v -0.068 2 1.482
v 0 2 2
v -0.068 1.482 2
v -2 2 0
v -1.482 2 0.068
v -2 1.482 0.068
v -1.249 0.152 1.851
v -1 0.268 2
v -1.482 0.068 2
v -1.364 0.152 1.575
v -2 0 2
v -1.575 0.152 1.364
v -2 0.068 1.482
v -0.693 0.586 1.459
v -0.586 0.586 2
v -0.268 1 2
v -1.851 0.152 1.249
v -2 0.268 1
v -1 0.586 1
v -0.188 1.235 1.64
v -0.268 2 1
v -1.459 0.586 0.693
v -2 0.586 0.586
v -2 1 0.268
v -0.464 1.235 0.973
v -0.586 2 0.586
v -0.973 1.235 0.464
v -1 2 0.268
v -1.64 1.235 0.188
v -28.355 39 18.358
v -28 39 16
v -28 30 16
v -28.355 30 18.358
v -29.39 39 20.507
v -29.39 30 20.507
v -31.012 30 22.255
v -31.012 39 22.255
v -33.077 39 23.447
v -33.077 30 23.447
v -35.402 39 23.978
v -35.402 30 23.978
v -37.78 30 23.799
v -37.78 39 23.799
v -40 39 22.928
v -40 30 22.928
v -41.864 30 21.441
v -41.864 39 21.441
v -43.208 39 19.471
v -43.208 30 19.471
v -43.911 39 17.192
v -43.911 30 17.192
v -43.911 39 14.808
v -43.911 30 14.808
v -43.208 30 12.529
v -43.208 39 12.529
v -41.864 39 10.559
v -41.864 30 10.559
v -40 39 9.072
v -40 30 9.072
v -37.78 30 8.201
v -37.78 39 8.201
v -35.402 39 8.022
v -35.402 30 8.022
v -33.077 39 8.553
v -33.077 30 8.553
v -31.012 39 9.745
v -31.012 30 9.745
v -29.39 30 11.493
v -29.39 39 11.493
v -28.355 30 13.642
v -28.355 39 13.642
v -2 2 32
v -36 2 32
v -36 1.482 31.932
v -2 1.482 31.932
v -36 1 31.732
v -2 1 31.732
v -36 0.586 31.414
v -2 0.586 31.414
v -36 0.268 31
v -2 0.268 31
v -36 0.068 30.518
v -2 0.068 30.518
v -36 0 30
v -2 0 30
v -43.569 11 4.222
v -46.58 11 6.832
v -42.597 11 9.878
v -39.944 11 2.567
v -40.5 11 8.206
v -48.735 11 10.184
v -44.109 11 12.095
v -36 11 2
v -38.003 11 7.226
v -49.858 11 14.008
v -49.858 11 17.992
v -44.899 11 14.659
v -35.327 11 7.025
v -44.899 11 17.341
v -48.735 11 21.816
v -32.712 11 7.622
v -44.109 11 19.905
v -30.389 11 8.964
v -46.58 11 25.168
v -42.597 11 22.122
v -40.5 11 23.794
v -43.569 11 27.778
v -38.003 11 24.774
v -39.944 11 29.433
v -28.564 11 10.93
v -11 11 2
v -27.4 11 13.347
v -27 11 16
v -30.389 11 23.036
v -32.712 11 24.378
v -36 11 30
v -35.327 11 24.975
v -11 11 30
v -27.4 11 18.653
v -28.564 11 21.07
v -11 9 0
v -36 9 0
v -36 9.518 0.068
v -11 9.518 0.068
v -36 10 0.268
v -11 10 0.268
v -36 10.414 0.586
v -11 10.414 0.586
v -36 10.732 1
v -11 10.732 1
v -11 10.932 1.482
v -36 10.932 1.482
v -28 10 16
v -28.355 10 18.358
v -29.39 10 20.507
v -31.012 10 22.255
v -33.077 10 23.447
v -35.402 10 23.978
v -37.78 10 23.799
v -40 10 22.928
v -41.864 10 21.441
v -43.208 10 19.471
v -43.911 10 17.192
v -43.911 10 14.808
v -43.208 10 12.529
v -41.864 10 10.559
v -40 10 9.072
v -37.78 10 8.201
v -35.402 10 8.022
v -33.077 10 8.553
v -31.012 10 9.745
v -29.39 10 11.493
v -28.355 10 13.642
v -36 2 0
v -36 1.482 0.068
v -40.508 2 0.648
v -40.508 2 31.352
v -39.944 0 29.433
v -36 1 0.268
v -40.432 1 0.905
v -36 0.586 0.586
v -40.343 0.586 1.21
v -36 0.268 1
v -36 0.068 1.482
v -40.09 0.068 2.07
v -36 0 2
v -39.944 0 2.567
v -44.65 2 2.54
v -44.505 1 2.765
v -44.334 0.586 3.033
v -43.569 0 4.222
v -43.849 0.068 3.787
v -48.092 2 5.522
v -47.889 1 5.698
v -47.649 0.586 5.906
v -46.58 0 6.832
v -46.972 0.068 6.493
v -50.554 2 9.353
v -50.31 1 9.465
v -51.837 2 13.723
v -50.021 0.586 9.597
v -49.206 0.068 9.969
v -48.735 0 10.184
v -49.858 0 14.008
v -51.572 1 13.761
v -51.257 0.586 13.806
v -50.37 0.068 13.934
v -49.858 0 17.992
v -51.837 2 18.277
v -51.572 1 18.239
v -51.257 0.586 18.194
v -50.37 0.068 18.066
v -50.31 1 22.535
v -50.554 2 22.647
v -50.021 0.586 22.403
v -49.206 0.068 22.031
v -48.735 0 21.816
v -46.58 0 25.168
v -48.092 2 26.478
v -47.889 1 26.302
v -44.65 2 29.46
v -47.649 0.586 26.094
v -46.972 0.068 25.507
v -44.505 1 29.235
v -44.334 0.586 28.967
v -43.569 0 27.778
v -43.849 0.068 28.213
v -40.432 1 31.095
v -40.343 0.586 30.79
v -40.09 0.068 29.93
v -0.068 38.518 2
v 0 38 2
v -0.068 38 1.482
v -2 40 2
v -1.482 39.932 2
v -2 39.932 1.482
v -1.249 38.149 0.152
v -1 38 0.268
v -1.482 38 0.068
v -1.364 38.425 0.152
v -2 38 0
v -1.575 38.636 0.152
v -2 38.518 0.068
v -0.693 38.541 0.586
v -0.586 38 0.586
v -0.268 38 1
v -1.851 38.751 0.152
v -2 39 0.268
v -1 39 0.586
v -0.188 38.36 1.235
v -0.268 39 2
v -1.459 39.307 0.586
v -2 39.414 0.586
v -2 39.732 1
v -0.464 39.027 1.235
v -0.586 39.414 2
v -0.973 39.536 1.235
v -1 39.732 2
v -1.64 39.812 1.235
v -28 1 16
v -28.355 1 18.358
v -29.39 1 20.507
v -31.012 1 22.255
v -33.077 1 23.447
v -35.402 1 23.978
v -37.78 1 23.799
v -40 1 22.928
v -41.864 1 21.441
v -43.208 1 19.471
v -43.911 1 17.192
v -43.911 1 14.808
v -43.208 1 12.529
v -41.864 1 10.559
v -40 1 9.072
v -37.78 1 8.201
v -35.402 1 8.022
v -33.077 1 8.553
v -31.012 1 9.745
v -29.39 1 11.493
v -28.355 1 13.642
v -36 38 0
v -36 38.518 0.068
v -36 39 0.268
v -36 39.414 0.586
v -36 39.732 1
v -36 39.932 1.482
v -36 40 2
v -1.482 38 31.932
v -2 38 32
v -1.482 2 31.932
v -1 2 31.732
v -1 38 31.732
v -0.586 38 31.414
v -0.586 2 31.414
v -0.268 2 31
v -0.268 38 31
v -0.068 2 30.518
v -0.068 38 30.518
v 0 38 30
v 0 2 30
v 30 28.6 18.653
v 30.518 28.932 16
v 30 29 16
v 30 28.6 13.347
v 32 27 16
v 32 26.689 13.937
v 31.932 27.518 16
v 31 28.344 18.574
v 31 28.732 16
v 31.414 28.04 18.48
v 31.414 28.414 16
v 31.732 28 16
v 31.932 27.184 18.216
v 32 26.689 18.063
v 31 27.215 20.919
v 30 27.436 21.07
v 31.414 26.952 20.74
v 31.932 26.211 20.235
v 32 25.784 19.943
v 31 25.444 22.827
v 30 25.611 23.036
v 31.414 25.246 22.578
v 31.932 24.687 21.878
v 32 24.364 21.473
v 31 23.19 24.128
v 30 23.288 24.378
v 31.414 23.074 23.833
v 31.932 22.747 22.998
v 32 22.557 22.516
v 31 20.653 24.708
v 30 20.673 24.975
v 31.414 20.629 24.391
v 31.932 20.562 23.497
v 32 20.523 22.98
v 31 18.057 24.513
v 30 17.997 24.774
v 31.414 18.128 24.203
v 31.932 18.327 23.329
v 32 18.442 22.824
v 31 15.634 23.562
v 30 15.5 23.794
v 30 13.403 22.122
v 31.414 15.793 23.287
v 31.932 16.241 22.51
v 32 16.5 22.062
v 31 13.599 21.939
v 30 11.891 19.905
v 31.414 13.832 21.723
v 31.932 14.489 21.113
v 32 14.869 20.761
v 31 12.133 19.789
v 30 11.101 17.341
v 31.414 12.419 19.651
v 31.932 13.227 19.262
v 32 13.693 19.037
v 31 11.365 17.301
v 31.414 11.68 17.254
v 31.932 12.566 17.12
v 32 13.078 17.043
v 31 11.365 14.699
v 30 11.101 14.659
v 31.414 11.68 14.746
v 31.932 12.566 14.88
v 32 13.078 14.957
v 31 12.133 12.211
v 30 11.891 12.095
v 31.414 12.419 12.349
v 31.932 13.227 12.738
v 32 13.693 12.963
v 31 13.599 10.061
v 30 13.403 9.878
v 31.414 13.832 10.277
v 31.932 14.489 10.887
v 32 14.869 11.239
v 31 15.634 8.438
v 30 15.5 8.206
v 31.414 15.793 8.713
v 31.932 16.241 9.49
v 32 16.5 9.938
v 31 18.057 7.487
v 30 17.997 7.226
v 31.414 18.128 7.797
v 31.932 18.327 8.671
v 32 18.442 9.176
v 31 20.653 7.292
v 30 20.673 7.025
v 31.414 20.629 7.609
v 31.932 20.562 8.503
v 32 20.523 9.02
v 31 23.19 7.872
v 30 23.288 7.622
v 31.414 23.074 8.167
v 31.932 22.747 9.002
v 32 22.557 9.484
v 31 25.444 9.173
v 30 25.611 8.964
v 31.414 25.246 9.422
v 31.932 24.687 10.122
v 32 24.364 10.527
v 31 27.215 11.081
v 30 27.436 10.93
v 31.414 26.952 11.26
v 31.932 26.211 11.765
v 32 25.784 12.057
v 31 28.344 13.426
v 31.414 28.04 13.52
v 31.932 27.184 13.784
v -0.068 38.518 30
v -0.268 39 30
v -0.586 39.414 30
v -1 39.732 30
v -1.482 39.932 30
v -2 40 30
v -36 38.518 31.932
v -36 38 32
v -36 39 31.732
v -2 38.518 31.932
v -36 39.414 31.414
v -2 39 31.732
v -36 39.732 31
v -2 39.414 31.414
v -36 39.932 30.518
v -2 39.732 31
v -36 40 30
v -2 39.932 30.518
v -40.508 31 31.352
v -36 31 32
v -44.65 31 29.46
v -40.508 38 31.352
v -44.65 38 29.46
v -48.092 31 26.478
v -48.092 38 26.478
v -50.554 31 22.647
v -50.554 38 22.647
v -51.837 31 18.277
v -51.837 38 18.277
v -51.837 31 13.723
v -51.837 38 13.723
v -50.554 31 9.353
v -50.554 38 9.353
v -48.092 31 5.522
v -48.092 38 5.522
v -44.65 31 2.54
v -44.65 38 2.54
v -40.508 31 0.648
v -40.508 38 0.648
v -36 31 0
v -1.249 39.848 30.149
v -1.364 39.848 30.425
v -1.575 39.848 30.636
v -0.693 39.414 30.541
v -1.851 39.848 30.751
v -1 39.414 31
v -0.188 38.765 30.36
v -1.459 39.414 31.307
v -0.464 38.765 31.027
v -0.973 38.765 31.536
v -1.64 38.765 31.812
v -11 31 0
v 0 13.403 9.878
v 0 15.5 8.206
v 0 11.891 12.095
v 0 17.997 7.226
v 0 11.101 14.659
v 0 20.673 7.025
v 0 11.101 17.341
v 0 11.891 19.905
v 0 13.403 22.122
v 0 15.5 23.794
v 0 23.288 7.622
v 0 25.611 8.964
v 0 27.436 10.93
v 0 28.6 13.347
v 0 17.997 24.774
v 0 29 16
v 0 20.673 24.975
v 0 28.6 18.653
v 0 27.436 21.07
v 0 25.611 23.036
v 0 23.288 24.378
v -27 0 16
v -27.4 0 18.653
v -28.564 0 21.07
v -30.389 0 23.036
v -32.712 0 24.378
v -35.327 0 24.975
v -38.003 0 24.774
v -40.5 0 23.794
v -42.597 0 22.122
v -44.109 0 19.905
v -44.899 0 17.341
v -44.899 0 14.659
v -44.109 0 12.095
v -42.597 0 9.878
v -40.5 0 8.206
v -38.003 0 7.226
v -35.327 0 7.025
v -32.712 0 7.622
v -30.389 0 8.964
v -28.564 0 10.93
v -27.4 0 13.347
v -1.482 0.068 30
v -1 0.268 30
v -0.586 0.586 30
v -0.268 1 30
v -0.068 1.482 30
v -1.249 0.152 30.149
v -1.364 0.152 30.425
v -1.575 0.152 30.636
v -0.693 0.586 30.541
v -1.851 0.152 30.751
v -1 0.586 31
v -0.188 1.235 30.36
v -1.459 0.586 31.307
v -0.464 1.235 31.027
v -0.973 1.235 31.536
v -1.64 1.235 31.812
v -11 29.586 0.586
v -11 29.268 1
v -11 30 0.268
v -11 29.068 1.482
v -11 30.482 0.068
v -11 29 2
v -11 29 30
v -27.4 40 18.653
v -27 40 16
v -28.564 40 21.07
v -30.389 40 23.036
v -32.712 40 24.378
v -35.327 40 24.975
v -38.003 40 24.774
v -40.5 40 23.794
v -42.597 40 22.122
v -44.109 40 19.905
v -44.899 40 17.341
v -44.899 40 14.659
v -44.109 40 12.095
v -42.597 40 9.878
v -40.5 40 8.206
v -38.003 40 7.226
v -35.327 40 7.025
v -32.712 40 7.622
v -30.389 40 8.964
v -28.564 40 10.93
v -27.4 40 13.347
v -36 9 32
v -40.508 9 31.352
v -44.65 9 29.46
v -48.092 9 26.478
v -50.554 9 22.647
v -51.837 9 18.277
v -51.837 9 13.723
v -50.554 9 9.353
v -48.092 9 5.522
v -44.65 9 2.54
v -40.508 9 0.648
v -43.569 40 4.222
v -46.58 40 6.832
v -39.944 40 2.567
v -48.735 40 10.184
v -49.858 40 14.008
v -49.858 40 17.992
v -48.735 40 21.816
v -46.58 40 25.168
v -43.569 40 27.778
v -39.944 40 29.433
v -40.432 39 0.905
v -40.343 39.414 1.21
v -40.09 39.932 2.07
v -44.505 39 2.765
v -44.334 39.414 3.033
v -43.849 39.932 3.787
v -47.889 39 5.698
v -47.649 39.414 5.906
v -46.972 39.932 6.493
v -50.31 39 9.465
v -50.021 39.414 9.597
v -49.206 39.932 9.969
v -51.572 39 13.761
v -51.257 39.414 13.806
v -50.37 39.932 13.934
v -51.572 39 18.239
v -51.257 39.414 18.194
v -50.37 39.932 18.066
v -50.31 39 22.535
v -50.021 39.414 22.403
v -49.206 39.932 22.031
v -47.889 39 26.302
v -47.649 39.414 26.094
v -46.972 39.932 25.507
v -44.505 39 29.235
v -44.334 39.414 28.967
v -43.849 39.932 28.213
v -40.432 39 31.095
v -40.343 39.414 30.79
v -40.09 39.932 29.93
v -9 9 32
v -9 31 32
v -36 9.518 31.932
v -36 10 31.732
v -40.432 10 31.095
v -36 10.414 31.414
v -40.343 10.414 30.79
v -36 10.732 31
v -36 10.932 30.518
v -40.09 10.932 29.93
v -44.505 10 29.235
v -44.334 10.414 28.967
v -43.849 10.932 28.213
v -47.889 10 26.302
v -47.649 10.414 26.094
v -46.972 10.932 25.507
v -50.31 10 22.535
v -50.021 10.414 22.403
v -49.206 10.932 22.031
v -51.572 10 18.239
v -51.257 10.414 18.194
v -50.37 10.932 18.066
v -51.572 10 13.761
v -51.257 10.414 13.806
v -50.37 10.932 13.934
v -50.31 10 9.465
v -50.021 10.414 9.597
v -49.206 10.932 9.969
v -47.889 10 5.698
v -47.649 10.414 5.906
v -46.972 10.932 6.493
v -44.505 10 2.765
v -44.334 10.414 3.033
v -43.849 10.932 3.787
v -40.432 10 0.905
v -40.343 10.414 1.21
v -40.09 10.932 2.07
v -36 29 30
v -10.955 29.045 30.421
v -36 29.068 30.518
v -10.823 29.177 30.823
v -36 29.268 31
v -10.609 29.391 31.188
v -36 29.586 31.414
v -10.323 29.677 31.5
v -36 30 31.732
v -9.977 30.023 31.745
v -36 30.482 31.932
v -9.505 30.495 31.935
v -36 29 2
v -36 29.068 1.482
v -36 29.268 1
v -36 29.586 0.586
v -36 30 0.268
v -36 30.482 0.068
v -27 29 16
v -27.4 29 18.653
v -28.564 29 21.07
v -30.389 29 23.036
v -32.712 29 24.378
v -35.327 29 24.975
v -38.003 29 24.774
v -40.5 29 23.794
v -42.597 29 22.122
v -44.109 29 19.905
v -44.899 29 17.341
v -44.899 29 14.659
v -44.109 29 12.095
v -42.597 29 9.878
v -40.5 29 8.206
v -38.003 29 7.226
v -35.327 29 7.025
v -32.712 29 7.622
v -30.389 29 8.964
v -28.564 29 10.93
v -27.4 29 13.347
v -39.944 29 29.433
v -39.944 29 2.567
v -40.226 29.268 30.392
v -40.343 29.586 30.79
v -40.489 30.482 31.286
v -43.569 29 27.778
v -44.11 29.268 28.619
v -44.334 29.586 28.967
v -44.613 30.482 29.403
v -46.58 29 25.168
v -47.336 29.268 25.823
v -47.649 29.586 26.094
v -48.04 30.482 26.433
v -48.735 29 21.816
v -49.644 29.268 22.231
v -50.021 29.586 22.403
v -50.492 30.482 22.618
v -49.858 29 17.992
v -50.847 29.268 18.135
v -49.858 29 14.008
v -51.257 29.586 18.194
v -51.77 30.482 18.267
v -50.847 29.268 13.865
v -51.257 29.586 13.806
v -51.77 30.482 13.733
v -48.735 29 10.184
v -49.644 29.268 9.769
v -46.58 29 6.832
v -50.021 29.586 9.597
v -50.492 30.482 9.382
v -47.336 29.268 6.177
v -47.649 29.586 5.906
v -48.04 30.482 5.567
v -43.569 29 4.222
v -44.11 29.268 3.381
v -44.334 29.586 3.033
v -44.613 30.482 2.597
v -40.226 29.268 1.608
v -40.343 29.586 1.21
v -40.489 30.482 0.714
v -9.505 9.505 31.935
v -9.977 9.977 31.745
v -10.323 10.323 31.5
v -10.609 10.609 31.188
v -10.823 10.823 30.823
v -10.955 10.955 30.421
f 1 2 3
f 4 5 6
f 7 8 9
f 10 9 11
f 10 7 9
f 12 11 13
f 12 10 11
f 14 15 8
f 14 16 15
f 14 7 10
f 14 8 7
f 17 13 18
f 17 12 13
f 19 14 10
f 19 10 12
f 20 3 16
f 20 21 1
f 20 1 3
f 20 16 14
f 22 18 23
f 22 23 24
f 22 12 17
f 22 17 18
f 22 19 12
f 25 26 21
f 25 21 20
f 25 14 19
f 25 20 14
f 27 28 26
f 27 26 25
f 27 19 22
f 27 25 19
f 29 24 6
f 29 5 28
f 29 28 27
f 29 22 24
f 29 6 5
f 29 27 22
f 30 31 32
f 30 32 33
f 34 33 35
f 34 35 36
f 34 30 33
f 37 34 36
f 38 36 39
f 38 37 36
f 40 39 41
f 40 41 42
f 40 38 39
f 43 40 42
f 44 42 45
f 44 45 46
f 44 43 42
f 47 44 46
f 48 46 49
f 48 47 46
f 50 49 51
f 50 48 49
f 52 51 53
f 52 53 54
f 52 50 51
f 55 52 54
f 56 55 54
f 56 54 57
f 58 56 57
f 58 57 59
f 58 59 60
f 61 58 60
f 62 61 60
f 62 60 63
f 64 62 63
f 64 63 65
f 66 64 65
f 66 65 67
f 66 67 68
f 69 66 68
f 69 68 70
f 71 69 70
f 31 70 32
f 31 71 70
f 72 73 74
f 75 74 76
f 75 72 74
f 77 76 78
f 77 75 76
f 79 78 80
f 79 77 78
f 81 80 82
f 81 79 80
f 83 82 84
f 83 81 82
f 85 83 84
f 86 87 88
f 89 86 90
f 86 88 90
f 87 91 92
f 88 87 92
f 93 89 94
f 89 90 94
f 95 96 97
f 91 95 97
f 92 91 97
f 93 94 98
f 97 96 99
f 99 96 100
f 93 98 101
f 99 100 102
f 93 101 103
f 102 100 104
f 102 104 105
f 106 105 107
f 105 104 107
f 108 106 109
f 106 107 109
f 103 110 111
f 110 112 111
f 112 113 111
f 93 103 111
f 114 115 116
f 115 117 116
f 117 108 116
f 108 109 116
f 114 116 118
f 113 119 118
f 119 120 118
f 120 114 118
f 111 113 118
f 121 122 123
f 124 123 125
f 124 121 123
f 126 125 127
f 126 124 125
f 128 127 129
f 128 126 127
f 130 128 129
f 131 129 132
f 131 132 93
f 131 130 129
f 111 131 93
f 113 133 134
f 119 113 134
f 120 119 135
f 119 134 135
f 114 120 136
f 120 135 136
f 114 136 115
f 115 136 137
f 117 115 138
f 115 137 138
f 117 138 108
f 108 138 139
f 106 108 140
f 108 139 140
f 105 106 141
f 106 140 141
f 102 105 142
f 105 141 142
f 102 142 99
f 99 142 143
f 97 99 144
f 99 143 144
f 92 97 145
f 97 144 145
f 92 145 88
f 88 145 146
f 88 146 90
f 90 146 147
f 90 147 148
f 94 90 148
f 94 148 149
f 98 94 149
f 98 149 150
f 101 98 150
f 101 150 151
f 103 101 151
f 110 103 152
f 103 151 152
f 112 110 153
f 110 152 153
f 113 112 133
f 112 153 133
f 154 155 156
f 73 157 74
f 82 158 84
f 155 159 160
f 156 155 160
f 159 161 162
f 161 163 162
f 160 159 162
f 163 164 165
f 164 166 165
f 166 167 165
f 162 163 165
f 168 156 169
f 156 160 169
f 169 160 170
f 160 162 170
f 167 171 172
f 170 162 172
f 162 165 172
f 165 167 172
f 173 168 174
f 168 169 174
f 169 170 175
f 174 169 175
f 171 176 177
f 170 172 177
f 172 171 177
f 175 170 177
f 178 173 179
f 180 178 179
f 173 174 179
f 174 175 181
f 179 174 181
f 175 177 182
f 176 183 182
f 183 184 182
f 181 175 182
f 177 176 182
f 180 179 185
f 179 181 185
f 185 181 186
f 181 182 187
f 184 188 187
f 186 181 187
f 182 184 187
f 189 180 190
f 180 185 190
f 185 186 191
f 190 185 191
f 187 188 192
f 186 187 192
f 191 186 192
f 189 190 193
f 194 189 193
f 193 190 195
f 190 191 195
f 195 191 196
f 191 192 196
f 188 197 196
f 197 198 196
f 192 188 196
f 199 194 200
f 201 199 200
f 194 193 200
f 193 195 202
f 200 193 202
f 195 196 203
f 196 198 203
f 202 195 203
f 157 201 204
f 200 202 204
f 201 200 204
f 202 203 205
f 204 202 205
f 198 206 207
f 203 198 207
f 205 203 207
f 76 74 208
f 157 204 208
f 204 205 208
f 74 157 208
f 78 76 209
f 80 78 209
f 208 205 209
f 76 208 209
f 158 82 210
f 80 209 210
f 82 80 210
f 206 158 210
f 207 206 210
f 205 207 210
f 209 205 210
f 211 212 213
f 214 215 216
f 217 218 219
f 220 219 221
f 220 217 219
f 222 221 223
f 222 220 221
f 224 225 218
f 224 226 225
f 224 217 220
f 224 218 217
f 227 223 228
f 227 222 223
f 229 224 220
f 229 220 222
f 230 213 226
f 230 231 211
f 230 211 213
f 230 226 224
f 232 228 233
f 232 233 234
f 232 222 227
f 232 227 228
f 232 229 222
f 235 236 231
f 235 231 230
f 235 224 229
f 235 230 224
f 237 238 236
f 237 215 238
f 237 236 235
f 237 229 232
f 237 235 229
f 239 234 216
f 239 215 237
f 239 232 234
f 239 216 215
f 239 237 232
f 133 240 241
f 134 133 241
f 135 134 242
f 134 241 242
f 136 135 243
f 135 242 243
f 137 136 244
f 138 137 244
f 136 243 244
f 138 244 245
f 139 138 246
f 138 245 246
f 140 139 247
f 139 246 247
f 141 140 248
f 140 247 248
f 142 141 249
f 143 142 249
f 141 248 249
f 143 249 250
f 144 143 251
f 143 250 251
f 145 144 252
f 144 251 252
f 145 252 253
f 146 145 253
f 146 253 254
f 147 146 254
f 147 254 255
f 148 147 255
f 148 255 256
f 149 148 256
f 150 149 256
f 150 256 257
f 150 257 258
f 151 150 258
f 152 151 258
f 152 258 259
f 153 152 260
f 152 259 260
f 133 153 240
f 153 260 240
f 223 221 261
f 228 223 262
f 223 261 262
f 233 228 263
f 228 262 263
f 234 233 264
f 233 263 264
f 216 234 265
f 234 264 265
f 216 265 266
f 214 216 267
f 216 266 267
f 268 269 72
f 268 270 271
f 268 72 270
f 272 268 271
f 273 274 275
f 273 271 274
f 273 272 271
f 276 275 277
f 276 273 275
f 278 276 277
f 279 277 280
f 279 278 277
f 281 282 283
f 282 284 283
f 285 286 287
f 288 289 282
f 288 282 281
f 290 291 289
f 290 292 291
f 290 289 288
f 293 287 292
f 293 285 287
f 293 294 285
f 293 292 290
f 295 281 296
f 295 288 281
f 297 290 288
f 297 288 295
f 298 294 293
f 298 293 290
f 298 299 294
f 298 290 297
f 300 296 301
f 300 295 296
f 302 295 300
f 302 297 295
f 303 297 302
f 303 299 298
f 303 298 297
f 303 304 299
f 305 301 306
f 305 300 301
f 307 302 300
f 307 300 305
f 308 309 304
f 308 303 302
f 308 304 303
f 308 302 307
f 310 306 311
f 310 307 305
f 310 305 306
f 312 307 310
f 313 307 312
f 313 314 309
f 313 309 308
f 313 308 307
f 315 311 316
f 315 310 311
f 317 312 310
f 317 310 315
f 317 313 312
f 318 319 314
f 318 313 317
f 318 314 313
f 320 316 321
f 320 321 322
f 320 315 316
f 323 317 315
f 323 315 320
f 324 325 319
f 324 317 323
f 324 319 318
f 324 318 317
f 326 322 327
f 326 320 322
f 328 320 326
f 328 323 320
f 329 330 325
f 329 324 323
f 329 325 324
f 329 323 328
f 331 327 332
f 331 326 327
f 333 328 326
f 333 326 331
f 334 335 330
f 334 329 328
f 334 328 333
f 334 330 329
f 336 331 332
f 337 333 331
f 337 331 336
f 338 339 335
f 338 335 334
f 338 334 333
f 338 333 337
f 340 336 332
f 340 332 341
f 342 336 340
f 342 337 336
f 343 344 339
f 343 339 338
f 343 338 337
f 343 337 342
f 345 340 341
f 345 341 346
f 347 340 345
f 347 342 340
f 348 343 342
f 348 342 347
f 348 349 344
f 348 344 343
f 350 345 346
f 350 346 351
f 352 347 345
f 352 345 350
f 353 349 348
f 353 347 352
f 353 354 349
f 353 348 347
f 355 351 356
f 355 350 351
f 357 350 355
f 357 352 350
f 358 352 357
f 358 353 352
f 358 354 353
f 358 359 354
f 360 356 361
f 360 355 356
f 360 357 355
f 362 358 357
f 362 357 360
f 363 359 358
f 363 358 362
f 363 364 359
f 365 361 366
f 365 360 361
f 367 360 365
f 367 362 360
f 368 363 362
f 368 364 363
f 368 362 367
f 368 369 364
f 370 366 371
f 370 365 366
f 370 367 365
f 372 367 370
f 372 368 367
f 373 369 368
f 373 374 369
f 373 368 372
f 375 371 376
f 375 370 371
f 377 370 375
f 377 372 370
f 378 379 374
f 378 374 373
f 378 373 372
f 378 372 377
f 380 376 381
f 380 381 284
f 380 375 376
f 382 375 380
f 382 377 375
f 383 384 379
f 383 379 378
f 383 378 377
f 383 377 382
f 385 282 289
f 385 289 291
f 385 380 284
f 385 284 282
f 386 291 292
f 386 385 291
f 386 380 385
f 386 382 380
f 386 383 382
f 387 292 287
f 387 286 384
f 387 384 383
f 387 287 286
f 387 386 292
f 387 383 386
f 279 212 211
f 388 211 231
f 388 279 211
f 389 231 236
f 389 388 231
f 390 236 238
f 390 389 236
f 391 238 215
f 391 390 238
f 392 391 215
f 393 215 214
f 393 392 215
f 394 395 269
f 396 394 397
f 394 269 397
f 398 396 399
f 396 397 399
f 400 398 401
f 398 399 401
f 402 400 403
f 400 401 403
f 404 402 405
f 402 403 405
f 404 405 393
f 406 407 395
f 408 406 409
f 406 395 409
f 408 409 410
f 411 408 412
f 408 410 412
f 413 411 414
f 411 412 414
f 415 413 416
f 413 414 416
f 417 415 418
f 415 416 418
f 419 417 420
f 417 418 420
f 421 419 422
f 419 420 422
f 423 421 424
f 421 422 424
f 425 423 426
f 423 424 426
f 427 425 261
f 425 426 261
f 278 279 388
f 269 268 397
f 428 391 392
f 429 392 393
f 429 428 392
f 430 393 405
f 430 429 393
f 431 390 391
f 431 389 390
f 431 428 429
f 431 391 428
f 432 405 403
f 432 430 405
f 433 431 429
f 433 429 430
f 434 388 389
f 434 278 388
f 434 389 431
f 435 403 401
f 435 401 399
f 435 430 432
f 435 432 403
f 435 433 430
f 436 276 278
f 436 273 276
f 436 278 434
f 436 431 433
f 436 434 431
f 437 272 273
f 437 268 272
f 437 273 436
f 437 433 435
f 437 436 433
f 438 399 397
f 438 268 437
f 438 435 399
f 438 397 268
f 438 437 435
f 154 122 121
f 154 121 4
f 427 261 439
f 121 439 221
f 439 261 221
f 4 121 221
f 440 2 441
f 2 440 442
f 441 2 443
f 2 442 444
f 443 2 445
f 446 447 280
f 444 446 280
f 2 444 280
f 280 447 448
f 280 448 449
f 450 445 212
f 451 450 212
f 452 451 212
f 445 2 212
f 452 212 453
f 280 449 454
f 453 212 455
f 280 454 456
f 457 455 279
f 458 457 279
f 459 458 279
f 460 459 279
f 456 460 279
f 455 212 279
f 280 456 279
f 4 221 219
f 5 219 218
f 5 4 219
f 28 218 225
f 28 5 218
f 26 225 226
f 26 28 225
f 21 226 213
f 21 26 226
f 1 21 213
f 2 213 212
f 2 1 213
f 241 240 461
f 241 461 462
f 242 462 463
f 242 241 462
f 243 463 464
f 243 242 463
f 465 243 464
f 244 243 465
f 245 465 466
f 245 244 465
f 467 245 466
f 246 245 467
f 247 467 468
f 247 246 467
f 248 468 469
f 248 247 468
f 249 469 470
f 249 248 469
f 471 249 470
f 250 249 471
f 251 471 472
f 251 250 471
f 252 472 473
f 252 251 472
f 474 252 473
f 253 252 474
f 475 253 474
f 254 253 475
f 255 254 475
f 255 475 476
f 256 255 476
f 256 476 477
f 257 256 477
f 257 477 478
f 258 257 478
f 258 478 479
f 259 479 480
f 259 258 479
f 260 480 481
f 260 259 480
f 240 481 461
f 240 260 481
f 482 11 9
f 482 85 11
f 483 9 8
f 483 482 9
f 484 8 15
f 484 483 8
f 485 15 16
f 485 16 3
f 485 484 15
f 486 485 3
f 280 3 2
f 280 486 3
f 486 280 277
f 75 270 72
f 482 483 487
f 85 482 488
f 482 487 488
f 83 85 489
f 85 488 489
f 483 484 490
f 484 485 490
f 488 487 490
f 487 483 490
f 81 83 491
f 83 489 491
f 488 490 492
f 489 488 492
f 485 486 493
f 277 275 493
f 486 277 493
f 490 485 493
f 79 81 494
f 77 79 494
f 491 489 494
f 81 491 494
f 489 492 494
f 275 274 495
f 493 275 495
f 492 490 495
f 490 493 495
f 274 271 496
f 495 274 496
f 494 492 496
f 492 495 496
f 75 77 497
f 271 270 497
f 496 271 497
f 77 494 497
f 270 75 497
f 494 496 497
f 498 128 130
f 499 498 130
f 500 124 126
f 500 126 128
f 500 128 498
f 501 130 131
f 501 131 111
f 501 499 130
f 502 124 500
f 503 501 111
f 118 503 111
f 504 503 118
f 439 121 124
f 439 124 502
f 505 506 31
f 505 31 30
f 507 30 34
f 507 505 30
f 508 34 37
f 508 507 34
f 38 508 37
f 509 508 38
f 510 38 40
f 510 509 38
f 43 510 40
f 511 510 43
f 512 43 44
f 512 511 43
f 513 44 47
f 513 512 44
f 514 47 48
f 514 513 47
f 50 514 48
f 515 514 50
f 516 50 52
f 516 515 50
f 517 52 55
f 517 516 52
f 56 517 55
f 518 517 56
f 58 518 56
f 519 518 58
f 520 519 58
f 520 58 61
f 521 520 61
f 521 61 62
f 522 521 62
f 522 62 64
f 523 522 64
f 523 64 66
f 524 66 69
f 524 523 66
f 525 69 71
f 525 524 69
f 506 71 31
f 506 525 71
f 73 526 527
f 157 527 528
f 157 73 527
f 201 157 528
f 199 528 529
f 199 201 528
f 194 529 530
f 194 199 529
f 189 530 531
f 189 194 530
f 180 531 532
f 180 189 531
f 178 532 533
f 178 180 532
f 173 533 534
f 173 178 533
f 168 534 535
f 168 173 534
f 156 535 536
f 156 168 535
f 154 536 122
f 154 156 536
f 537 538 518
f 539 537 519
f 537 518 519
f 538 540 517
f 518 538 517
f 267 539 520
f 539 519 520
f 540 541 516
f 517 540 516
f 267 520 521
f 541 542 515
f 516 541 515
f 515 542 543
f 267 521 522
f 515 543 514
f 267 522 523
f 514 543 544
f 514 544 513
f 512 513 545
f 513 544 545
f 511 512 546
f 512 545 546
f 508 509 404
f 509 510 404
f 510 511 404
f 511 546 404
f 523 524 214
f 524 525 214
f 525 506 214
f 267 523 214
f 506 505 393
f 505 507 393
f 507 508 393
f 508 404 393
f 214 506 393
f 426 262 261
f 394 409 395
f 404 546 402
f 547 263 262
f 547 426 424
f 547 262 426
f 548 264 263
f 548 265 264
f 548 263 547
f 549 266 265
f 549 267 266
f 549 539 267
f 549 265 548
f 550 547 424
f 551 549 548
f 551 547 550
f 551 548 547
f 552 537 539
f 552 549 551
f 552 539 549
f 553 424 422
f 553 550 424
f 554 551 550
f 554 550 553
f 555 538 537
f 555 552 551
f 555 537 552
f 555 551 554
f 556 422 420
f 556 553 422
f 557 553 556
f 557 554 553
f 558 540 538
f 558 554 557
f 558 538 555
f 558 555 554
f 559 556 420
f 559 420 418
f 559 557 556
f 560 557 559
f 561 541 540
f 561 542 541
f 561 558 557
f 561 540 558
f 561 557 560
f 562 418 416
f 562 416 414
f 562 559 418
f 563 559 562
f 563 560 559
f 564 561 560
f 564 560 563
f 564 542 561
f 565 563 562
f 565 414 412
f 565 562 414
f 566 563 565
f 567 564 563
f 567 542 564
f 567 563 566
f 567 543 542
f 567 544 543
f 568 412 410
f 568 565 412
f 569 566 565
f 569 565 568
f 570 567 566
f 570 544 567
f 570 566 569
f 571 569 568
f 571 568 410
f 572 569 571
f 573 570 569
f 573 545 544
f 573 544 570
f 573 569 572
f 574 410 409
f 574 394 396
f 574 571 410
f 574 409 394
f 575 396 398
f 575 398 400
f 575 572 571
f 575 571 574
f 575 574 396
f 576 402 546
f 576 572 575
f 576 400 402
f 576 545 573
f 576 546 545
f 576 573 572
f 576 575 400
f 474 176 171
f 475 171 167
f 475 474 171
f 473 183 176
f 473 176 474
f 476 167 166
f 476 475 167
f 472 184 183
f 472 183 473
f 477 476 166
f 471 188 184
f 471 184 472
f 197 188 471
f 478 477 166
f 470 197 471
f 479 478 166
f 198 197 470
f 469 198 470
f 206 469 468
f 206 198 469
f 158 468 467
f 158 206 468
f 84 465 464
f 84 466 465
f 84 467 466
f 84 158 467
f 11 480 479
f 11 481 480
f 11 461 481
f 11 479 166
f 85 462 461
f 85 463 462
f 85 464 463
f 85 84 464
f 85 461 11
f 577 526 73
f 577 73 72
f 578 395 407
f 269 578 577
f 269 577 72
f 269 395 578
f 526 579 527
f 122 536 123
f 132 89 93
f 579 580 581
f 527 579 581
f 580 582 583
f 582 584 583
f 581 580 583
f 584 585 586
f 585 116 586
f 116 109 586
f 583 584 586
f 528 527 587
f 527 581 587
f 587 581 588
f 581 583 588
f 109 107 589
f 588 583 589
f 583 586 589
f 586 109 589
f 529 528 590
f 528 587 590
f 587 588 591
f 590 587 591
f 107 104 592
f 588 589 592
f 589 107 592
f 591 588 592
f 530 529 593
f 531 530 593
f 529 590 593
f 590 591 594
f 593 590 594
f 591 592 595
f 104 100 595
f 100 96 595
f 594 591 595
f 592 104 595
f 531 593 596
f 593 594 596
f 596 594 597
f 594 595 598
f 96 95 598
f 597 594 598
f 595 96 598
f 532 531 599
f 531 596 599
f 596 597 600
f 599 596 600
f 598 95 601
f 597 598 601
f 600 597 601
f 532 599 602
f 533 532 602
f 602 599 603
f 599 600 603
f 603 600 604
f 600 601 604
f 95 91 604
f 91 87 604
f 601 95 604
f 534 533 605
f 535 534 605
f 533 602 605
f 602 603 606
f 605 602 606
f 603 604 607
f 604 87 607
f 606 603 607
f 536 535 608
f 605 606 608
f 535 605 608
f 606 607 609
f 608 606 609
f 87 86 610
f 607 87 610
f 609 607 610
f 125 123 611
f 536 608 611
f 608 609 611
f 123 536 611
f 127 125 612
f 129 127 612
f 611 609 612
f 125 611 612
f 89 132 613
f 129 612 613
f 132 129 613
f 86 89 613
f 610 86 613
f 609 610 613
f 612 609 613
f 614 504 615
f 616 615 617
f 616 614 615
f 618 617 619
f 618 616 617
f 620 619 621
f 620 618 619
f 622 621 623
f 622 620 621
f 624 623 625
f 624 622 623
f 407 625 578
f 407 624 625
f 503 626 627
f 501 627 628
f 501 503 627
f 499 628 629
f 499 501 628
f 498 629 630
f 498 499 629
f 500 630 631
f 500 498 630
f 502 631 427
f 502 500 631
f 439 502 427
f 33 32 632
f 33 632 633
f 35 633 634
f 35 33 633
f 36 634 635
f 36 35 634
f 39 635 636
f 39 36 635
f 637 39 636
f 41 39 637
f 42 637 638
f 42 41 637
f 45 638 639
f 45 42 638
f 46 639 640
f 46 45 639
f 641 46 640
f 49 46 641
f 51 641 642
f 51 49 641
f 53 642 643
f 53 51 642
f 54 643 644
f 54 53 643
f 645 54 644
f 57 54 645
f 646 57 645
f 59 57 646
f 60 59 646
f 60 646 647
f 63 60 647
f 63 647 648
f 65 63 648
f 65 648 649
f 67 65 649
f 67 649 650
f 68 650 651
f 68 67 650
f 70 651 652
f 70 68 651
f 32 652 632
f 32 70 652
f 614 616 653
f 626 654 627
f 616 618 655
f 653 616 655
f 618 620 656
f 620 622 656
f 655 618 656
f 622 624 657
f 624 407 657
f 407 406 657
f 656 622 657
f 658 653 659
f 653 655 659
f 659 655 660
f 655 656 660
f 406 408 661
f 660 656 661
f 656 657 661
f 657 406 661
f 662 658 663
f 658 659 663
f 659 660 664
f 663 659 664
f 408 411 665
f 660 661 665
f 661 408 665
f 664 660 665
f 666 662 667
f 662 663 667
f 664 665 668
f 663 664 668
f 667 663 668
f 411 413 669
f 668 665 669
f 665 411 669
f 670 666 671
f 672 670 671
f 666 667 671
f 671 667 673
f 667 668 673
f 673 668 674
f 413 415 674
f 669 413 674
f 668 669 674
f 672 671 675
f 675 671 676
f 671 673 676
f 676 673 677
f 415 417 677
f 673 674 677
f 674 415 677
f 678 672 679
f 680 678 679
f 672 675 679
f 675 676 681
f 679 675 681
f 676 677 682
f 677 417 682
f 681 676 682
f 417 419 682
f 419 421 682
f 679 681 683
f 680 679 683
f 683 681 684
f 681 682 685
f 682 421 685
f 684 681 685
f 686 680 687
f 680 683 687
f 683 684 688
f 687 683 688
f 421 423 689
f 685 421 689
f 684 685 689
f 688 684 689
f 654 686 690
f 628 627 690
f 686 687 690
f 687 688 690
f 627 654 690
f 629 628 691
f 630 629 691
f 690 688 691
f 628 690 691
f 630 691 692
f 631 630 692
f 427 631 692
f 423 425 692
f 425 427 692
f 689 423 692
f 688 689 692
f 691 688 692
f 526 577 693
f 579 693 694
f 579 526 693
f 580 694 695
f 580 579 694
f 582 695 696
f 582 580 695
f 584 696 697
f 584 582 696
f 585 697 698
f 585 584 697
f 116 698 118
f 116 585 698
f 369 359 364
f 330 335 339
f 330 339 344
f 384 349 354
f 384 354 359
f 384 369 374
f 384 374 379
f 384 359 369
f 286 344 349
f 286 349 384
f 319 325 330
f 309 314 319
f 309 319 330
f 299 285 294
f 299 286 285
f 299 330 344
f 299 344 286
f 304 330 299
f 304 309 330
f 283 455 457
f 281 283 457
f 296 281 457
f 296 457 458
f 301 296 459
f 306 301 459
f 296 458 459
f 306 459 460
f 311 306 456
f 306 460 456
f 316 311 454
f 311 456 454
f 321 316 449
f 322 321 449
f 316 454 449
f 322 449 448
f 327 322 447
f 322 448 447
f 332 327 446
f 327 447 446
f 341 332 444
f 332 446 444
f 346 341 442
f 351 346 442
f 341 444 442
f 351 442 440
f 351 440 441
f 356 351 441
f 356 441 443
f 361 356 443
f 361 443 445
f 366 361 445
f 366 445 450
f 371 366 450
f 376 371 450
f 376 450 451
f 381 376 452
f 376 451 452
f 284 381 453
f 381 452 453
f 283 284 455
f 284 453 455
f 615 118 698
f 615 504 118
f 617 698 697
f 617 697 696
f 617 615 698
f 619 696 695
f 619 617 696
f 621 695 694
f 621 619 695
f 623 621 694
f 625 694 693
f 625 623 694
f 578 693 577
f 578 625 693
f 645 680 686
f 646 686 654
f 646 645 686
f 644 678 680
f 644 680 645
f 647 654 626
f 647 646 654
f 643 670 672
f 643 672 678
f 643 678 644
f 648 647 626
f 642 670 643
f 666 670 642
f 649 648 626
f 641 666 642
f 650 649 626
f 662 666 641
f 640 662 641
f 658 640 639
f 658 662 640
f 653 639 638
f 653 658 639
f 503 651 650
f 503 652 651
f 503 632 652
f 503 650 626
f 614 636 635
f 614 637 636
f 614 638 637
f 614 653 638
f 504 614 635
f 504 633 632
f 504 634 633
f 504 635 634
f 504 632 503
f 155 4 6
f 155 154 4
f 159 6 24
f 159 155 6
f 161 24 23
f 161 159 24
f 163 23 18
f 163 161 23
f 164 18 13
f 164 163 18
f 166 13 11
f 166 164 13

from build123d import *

# Parameters (mm, degrees)
F0_R     = 8
F1_DEPTH = 11
F2_W     = 11
F2_H     = 32
F3_DEPTH = 20
F5_R     = 9
F6_DEPTH = 32
F7_SIZE  = 1
F8_R     = 2


with BuildPart() as f1:
    # F0 (on Front) → F1 (new body)
    with BuildSketch(Plane.XZ):
        with BuildLine():
            Line((-36, 0), (-11, 0))
            Line((-11, 0), (-11, 32))
            Line((-11, 32), (-36, 32))
            ThreePointArc((-36, 32), (-52, 16), (-36, 0))
        make_face()
        with Locations((-36, 16)):
            Circle(F0_R, mode=Mode.SUBTRACT)
    extrude(amount=-F1_DEPTH)

    # F2 (on Front) → F3 (join)
    with BuildSketch(Plane.XZ):
        with Locations((-5.5, 16)):
            Rectangle(F2_W, F2_H)
    extrude(amount=-F3_DEPTH)

    # F4: F1 across face


with BuildPart() as f1_1:
    add(f1.part)
    add(f1.part.mirror(Plane(origin=(-5.5, 20, 16), x_dir=(1, 0, 0), z_dir=(0, 1, 0))))

    # F5 (on face) → F6 (join)
    with BuildSketch(Plane.YZ):
        with Locations((20, 16)):
            Circle(F5_R)
    extrude(amount=F6_DEPTH)

    # F7
    f7_edges = [f1_1.edges().sort_by_distance(p)[0] for p in [
        (-44, 0, 16),
        (-44, 11, 16),
        (-44, 29, 16),
        (-44, 40, 16),
    ]]
    chamfer(f7_edges, length=F7_SIZE)

    # F8
    f8_edges = [f1_1.edges().sort_by_distance(p)[0] for p in [
        (32, 11, 16),
        (0, 20, 32),
        (0, 40, 16),
        (0, 20, 0),
        (0, 0, 16),
        (-36, 5.5, 32),
        (-18, 0, 32),
        (-18, 40, 32),
        (-36, 34.5, 32),
        (-23.5, 29, 32),
        (-11, 20, 32),
        (-23.5, 11, 32),
    ]]
    fillet(f8_edges, radius=F8_R)


solid = f1_1.part
